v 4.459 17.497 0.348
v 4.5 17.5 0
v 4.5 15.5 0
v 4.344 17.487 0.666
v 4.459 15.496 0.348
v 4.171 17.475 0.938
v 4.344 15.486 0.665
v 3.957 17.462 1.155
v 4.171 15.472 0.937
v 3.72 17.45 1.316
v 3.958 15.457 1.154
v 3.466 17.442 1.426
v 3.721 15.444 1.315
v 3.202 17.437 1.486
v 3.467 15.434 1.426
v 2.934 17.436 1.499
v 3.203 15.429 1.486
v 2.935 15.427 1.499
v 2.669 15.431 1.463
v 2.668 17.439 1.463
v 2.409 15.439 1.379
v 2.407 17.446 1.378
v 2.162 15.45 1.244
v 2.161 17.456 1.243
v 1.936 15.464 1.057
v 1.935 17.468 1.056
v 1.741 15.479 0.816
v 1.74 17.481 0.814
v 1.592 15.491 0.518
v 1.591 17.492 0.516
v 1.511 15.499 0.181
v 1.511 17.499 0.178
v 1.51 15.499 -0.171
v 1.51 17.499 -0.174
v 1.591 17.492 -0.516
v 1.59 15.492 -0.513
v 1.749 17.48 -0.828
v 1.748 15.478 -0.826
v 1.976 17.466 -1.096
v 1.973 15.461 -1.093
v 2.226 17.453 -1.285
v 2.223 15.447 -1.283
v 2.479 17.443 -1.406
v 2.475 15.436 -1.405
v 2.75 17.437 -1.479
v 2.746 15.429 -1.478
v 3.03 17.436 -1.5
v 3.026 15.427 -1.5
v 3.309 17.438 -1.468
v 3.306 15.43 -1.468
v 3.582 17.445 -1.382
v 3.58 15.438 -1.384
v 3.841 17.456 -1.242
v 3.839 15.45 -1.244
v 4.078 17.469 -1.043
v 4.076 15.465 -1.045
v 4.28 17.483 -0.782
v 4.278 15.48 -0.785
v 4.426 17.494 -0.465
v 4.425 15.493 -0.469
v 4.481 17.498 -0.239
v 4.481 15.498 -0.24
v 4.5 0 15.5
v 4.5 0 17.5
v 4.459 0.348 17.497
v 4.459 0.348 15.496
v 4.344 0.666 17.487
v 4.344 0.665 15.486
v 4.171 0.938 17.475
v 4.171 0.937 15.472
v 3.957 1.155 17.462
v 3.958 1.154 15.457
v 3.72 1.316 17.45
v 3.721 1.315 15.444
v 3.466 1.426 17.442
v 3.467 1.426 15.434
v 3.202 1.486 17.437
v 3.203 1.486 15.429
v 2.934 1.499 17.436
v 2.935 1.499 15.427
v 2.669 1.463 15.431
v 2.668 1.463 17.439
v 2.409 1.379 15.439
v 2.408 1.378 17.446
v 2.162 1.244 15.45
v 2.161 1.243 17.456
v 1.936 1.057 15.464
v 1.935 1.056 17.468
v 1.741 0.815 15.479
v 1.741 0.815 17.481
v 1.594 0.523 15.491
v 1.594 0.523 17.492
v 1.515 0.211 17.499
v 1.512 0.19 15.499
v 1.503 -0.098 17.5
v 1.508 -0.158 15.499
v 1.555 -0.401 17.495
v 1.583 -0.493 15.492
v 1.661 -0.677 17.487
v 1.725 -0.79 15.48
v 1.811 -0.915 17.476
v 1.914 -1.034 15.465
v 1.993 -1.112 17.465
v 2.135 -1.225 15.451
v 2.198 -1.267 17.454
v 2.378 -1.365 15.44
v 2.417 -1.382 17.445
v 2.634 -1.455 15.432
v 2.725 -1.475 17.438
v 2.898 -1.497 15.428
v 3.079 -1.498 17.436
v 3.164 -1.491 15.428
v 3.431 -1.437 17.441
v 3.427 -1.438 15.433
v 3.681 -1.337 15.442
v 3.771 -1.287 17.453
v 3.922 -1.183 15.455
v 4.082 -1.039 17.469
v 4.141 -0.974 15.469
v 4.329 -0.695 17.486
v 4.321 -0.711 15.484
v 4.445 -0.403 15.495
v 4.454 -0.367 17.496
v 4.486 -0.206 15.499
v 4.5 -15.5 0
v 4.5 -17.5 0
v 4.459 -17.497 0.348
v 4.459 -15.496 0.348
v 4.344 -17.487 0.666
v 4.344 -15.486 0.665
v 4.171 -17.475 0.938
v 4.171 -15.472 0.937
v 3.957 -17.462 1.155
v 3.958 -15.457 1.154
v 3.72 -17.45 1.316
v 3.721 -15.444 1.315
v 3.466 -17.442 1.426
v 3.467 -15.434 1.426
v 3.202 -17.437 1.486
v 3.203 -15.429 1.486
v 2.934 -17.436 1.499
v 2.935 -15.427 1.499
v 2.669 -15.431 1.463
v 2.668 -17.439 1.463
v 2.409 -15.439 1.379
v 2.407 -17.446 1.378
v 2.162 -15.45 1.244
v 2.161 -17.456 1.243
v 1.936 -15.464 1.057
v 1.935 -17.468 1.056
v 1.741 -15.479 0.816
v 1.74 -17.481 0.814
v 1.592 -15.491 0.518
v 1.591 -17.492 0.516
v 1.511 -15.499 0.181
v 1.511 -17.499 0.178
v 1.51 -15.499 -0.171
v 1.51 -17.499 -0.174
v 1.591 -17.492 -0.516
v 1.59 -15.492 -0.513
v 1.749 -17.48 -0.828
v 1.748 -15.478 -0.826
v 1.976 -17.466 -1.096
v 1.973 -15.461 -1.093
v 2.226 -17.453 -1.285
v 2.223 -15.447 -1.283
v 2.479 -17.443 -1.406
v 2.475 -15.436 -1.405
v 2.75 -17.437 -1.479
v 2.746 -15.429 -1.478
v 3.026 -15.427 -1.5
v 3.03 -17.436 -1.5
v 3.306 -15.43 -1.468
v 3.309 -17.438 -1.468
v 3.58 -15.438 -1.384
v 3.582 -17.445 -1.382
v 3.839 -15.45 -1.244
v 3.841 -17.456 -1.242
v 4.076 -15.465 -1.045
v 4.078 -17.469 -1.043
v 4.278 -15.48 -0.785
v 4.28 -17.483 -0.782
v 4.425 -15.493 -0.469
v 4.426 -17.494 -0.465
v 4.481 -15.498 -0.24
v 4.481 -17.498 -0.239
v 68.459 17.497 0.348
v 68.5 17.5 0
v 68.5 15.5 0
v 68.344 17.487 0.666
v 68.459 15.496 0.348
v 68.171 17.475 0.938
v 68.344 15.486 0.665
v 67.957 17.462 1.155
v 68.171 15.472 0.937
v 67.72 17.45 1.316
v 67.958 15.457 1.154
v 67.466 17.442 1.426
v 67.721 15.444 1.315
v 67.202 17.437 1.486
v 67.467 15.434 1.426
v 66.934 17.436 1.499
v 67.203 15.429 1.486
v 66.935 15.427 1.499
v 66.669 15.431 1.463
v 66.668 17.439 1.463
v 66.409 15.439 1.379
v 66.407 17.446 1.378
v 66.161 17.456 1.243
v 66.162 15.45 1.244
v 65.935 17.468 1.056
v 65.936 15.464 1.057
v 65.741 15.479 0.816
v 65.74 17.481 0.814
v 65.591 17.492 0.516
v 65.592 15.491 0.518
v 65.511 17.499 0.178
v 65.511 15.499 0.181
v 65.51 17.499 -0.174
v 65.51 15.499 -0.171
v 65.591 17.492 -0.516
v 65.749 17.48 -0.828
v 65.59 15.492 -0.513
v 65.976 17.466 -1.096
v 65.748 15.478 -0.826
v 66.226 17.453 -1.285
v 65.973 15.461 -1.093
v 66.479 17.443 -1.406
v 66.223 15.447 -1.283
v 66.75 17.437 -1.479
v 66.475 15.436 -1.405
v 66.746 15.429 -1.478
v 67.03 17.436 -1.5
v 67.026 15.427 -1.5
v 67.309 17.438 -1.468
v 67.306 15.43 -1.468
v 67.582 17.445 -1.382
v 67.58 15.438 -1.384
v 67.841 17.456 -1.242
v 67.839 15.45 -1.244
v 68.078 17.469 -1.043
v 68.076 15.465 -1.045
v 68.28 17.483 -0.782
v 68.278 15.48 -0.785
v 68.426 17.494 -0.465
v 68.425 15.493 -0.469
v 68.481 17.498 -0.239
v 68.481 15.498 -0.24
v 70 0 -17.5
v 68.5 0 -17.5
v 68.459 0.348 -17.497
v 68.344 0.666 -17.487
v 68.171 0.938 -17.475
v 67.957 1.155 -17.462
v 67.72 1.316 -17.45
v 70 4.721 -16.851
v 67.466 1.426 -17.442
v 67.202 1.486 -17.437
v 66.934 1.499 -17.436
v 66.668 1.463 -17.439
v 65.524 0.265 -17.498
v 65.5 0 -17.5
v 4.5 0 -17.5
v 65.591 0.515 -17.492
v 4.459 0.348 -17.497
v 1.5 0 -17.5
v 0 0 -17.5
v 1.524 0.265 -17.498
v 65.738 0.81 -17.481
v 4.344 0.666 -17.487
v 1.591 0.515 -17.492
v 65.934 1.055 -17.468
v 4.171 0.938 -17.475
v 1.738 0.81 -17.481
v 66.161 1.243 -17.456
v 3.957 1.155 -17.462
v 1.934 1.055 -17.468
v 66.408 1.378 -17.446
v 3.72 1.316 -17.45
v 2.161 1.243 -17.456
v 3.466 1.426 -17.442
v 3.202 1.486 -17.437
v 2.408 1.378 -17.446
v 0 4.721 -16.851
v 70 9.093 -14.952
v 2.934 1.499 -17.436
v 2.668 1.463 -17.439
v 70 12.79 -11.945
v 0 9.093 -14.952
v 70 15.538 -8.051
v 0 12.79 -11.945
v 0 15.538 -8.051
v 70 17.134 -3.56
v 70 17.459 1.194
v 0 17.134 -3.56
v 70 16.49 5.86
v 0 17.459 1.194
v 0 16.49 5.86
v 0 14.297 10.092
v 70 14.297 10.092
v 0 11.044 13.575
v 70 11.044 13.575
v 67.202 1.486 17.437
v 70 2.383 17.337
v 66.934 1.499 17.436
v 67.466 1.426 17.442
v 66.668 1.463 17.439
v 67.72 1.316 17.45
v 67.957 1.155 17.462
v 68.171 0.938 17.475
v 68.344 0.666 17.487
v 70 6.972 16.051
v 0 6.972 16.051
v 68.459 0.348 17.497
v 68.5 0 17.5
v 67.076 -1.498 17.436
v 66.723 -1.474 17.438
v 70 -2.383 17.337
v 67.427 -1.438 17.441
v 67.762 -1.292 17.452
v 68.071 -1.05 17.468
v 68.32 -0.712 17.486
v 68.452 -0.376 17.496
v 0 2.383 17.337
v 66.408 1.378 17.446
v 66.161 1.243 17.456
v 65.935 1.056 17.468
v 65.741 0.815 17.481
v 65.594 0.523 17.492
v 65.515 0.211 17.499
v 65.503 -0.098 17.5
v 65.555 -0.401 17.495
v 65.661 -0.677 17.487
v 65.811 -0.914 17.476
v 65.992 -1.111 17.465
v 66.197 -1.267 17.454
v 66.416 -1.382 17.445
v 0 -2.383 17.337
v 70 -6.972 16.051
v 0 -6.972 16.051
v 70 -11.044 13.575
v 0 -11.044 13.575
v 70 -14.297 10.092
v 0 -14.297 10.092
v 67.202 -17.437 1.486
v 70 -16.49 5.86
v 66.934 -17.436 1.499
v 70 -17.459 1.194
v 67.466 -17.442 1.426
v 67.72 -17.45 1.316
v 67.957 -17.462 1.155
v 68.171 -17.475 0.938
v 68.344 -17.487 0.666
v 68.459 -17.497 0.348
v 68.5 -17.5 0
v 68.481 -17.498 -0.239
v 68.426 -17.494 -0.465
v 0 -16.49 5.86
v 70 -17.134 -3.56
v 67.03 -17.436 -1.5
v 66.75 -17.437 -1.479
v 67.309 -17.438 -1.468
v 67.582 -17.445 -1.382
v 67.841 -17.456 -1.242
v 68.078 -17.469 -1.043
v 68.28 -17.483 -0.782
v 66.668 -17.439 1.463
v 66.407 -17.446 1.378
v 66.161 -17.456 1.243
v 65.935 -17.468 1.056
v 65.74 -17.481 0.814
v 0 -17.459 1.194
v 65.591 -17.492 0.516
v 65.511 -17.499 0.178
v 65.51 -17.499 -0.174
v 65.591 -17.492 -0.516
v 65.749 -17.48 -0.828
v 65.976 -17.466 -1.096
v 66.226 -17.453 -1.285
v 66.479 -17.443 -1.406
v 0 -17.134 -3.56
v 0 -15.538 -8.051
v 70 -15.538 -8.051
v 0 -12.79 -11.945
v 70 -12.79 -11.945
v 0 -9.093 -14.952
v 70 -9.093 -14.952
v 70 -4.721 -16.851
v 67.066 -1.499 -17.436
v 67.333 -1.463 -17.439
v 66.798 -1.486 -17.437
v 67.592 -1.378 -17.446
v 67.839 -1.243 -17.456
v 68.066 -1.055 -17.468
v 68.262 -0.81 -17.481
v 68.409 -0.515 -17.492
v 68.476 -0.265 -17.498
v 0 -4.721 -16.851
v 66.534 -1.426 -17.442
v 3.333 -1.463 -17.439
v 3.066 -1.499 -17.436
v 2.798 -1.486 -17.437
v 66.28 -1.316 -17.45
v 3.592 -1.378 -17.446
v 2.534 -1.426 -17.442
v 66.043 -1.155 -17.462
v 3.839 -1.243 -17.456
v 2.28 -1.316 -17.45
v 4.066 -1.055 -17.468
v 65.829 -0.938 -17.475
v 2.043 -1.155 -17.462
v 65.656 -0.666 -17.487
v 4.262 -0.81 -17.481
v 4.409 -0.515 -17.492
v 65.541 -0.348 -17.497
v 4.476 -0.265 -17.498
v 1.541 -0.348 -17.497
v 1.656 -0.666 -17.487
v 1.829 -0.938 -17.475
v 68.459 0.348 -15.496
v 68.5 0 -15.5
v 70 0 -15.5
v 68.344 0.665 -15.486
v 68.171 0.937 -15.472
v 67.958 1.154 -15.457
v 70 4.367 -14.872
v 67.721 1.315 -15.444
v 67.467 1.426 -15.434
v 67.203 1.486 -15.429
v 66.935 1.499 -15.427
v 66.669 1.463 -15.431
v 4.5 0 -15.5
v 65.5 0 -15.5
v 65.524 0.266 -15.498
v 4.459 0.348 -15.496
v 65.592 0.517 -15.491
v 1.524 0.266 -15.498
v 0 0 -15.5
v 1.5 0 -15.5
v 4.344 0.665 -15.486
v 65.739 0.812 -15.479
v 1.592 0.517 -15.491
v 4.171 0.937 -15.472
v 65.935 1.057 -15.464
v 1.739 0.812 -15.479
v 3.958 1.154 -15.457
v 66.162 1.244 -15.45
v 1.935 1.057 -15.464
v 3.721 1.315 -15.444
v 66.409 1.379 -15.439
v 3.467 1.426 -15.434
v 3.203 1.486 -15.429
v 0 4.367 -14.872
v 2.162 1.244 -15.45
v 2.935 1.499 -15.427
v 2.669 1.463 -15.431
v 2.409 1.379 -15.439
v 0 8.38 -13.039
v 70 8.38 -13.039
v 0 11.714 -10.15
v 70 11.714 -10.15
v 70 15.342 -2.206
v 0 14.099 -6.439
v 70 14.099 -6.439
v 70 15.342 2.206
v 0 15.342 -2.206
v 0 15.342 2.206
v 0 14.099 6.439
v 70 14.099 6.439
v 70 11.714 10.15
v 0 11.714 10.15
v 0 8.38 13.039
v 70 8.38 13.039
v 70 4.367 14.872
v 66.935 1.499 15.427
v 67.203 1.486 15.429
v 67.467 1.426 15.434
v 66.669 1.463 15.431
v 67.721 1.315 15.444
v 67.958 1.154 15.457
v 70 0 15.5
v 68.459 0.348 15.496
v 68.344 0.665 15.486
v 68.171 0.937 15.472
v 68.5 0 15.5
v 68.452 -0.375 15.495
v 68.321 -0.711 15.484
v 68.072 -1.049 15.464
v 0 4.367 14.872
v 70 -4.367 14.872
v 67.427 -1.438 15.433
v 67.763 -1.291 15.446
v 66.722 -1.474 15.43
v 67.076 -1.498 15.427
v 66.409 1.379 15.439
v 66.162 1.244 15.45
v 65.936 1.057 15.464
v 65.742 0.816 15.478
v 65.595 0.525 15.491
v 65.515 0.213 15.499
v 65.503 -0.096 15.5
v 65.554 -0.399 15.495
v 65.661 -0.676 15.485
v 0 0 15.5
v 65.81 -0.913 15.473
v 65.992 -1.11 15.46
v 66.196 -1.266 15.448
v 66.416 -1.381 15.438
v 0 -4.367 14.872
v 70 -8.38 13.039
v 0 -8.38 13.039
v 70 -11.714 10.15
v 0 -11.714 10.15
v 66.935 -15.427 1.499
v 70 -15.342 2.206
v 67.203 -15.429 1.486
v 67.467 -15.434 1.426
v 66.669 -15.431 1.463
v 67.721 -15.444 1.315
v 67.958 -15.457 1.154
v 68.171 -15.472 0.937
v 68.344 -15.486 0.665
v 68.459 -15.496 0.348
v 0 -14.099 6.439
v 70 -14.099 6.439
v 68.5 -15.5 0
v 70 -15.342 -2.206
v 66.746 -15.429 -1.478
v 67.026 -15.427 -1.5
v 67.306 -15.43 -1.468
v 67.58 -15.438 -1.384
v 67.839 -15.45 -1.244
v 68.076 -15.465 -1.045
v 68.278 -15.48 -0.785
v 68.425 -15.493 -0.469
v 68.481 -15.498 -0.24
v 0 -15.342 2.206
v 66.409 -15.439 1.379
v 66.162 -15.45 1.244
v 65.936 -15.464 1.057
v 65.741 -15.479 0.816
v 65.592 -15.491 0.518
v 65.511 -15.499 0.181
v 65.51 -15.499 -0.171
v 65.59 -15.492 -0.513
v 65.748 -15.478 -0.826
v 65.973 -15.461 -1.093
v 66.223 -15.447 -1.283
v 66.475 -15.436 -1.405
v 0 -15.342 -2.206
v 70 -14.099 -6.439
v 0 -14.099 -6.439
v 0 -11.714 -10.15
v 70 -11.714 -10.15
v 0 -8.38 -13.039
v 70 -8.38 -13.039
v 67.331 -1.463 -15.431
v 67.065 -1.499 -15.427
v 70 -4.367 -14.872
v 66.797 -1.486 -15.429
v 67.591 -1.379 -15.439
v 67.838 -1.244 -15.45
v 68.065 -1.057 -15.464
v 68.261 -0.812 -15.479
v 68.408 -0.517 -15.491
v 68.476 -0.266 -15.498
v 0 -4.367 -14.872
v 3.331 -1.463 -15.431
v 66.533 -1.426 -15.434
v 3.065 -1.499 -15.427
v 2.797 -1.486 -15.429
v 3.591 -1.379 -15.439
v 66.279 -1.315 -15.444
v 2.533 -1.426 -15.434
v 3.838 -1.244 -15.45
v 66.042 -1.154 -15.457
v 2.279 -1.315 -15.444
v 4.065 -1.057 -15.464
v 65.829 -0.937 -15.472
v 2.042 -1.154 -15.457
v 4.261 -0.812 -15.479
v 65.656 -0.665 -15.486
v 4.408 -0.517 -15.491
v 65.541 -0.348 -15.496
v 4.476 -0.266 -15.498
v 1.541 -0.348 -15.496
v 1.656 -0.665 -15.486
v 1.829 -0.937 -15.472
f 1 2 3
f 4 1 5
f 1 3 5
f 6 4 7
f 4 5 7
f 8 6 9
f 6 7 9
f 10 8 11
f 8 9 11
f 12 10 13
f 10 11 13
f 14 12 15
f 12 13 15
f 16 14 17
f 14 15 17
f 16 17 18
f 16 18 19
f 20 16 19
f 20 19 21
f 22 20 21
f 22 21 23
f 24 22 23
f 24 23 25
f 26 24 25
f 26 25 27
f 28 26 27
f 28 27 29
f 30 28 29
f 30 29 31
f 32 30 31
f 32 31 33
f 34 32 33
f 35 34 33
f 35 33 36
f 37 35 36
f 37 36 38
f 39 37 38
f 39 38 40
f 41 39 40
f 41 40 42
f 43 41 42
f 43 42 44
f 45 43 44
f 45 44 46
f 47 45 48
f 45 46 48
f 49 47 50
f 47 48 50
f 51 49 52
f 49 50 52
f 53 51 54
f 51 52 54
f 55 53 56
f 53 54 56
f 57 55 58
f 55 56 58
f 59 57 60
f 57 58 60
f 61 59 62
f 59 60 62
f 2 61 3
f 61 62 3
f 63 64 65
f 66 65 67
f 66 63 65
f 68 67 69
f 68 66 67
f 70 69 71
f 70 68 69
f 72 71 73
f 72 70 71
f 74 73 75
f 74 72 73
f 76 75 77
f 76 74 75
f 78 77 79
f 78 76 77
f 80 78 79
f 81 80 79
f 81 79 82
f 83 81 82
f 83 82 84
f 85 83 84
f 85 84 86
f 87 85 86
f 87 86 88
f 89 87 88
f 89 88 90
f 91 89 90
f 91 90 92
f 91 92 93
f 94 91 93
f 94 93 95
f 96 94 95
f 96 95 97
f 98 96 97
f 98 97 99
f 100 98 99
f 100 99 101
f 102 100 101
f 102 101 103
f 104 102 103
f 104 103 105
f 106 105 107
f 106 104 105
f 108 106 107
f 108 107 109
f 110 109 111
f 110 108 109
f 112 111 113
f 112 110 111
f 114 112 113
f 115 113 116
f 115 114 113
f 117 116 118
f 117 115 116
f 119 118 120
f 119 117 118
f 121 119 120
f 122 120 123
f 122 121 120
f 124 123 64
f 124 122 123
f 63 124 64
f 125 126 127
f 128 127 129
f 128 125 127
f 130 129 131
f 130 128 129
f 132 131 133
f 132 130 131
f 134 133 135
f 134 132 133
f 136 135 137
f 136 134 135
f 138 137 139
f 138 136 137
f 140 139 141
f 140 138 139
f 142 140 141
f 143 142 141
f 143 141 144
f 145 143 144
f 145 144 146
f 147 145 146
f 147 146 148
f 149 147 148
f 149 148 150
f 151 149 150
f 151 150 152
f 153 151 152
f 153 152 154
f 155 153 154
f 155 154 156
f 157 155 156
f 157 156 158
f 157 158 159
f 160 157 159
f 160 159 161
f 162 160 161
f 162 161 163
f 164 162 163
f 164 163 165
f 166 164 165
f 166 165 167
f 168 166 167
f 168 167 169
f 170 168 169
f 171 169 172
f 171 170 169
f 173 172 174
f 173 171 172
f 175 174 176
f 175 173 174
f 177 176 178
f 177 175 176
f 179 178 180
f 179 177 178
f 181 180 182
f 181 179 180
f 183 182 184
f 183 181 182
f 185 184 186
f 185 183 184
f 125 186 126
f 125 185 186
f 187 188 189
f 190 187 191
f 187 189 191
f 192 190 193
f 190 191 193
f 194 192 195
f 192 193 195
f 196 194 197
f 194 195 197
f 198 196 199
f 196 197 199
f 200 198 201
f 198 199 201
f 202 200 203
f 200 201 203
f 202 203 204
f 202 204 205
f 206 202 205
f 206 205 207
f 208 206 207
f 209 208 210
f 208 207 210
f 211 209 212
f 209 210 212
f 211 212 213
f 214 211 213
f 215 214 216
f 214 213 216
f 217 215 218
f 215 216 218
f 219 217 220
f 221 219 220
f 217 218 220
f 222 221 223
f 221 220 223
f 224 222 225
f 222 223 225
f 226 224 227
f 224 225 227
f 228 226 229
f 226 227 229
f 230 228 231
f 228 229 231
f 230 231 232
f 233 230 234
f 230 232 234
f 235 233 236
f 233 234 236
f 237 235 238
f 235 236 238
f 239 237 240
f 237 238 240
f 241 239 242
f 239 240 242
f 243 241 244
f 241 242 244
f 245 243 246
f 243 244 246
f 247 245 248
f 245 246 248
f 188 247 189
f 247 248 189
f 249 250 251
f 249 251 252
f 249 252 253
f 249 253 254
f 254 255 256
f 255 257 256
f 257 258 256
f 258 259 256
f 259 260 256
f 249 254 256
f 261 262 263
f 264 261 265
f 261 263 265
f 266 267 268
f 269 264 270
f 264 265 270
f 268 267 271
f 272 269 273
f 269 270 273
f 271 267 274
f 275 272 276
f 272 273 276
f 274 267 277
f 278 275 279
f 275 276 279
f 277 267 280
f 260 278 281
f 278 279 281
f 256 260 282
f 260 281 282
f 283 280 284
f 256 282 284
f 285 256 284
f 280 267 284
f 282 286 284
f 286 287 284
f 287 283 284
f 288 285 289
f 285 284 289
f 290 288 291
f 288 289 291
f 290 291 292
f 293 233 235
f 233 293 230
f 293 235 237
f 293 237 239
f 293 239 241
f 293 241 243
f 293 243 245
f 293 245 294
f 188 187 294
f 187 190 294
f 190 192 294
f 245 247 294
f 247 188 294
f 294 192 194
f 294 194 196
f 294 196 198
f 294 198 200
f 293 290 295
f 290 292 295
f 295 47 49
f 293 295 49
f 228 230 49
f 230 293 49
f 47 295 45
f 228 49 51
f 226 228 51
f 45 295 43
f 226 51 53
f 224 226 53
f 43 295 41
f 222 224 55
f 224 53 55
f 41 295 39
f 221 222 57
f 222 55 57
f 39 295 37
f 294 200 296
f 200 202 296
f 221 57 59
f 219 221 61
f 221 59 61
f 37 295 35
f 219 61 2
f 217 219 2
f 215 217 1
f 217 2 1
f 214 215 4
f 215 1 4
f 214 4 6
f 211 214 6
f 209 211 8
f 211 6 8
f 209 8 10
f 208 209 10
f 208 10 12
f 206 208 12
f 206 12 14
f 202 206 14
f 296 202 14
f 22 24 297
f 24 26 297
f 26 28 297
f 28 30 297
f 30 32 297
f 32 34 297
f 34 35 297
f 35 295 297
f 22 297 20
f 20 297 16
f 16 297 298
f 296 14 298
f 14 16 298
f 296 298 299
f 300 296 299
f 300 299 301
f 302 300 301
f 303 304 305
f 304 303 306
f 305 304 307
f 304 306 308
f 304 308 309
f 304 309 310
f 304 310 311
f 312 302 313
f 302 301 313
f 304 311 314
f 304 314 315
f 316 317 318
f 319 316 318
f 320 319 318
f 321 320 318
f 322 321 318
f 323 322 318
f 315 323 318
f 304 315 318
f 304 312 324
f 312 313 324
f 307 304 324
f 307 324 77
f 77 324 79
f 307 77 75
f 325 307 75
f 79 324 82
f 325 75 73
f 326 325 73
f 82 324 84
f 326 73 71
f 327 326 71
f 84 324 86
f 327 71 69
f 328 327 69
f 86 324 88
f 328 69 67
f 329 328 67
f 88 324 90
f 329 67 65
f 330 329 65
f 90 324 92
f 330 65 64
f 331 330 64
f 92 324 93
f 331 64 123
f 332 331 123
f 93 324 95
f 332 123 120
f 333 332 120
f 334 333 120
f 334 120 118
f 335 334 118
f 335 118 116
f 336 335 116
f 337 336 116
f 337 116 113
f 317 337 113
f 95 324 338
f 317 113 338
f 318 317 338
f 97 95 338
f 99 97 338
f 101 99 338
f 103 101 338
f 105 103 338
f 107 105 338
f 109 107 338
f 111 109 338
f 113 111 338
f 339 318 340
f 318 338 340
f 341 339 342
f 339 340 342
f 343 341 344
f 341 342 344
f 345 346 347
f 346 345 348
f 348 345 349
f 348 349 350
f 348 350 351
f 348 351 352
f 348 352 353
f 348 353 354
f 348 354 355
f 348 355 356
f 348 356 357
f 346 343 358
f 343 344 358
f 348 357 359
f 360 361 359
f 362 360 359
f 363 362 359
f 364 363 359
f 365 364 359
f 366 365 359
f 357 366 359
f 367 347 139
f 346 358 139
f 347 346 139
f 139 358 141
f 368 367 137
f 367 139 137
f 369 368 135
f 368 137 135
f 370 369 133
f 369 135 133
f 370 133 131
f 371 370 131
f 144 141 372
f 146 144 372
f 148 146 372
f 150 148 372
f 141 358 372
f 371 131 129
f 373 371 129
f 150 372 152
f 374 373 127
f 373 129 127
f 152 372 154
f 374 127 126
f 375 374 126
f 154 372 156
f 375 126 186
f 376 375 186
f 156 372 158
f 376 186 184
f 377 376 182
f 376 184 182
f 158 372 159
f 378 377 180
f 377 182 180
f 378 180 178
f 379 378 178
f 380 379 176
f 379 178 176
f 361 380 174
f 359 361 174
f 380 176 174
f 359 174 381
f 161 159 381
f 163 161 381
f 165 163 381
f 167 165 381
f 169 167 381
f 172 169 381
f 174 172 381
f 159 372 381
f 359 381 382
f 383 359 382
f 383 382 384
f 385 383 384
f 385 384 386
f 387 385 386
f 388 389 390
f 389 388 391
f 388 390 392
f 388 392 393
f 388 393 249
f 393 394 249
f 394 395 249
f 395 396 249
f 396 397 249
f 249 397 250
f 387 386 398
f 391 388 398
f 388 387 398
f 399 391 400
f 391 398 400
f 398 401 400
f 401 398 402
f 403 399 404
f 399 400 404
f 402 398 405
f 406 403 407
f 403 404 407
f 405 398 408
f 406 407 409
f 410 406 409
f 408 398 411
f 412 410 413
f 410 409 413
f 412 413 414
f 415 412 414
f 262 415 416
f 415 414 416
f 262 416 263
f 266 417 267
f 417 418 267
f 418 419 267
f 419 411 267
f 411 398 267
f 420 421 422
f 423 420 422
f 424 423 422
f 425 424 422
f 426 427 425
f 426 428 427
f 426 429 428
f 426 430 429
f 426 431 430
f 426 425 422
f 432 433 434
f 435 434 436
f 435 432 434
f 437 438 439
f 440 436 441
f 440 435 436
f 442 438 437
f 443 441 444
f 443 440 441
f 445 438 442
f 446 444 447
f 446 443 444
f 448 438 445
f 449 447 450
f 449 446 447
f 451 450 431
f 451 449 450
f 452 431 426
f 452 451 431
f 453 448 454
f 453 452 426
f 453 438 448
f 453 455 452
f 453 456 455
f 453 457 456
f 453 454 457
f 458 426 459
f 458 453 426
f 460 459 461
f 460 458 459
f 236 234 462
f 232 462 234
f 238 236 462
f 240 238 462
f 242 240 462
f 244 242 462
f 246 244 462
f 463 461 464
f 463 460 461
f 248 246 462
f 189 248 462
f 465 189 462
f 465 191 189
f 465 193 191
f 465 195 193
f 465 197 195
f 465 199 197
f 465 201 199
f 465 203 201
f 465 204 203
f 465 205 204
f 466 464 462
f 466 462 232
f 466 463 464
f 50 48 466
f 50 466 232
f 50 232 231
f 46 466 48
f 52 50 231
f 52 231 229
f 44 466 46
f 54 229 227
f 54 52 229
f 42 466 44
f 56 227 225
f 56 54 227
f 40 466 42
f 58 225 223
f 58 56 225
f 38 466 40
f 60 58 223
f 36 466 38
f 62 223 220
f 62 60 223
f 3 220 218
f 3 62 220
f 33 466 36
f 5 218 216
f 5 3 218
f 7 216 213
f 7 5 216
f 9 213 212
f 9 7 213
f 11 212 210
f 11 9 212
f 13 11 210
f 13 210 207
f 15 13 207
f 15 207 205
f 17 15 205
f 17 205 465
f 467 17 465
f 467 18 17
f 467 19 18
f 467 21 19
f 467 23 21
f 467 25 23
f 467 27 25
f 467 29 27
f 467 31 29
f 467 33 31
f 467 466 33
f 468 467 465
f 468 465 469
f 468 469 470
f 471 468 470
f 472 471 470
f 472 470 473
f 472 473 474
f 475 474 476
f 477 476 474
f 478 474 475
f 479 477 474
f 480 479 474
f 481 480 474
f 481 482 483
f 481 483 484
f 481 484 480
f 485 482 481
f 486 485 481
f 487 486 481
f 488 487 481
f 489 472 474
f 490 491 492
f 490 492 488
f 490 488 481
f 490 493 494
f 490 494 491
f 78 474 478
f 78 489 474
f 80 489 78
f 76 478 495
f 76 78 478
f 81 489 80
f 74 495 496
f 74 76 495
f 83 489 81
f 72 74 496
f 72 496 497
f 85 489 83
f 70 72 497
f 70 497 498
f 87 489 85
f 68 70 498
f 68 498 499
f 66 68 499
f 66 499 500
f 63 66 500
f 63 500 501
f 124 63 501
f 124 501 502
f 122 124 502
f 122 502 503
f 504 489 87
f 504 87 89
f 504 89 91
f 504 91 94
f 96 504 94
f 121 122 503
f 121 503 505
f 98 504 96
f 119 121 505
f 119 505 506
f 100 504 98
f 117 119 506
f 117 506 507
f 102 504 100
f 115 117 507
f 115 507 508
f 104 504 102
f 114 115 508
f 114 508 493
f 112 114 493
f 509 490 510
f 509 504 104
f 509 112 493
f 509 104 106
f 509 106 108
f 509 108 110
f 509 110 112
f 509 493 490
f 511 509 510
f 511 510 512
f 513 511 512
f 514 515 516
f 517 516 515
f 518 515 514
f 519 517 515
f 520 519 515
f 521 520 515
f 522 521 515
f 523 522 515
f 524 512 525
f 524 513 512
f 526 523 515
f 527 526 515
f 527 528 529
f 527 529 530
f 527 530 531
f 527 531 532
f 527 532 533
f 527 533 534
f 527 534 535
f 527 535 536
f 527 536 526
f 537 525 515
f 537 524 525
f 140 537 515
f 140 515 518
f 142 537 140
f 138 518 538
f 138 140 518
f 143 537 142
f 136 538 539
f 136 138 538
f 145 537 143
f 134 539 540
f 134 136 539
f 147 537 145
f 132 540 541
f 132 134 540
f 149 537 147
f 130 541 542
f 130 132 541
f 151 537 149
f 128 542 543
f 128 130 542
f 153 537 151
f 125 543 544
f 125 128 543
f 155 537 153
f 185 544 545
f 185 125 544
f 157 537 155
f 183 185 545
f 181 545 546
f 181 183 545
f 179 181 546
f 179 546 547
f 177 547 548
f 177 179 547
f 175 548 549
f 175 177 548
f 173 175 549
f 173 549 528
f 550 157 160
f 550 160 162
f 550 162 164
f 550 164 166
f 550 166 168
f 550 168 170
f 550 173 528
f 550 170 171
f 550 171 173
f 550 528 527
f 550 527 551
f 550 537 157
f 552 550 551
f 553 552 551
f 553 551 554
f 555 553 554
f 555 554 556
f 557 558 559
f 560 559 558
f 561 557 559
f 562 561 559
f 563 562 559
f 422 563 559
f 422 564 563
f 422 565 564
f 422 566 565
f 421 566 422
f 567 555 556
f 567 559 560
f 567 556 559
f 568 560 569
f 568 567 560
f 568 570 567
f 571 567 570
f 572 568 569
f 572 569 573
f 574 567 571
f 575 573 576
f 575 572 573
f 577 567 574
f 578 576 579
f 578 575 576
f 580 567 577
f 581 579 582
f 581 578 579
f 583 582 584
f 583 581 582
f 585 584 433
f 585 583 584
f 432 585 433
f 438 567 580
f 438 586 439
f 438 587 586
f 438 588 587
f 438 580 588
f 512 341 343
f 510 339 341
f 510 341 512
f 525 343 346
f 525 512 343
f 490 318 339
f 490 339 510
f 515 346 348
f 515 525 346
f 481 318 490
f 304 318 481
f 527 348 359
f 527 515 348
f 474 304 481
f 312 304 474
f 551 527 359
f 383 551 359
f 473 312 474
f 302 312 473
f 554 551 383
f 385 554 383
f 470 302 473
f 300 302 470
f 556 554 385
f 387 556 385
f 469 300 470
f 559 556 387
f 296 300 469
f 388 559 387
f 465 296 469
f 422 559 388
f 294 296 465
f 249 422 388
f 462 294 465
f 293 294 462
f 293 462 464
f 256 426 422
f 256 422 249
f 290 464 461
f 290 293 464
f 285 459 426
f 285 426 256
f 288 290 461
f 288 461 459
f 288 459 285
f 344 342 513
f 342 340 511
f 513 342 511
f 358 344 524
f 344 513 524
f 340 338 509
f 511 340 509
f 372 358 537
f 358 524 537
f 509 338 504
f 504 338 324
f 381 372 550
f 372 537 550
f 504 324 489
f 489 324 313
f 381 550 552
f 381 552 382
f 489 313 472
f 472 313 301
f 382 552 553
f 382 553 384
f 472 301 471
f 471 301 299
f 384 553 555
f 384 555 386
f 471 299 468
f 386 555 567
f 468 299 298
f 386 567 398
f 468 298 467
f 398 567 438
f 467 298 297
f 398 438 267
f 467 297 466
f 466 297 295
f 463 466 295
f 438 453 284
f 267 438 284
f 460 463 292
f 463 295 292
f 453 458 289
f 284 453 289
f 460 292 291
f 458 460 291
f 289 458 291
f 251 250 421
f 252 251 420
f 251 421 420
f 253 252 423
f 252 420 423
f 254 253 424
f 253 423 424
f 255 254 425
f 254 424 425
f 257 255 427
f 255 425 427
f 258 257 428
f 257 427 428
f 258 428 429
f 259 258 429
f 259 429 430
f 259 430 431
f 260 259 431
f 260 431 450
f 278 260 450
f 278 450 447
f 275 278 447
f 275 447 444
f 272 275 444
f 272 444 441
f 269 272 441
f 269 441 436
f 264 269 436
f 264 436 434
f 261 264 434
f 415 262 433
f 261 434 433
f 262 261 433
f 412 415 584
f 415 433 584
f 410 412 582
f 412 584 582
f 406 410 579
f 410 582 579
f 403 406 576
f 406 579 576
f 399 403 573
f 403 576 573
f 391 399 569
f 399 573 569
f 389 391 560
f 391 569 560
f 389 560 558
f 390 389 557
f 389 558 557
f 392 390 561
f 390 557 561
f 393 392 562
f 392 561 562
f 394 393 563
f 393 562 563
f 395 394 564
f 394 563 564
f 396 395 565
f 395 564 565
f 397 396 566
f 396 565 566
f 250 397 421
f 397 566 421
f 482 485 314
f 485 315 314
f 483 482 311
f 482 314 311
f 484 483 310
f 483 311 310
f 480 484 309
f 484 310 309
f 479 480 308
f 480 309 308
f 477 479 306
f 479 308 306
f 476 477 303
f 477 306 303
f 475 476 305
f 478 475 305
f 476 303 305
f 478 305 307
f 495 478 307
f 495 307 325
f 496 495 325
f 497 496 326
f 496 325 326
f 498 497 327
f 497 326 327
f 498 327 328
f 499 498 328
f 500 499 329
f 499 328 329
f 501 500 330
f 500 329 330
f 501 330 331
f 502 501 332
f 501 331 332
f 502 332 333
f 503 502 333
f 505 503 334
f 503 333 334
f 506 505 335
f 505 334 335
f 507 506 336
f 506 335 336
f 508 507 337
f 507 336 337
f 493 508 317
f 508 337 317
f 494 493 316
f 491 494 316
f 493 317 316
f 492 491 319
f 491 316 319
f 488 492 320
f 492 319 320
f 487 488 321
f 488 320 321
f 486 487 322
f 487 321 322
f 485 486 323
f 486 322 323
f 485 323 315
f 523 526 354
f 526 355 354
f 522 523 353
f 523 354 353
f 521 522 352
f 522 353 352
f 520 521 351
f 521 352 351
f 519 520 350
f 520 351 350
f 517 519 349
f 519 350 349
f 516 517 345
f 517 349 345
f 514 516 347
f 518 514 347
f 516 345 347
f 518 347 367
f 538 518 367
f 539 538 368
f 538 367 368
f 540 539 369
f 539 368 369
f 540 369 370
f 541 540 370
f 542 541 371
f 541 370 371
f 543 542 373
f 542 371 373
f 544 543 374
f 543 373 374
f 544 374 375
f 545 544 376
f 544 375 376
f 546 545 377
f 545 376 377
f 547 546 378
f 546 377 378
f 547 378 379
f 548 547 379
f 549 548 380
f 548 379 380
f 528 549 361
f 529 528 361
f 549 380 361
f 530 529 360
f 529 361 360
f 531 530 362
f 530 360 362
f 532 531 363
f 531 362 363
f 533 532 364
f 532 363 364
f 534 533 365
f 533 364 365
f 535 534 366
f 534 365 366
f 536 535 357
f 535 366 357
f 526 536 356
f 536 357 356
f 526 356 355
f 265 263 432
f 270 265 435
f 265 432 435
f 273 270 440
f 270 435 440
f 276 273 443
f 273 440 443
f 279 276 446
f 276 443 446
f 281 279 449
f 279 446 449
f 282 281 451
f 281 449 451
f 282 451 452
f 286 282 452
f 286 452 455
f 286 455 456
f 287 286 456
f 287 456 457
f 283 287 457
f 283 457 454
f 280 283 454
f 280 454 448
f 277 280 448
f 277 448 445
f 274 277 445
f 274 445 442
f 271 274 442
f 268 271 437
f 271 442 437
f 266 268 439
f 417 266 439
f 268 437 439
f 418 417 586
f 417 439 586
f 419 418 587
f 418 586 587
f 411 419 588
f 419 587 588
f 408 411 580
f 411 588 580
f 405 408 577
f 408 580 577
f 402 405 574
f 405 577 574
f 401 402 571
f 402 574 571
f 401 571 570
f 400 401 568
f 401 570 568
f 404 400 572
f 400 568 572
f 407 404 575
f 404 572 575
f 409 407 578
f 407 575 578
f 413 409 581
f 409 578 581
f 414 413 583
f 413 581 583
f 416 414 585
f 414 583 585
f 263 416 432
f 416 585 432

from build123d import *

# Parameters (mm, degrees)
SKETCH_1_R               = 17.5
SKETCH_1_R_2             = 15.5
EXTRUDE_1_DEPTH          = 70
SKETCH_2_R               = 1.5
CUT_EXTRUDE_1_DEPTH      = 75.246212025
PATTERN_CIRCULAR_1_COUNT = 2
PATTERN_CIRCULAR_1_ANGLE = 90


with BuildPart() as part:
    # Эскиз1 → Бобышка-Вытянуть1 (new body)
    with BuildSketch(Plane(origin=(0, 0, 0), x_dir=(0, 0, -1), z_dir=(1, 0, 0))):
        Circle(SKETCH_1_R)
        Circle(SKETCH_1_R_2, mode=Mode.SUBTRACT)
    extrude(amount=EXTRUDE_1_DEPTH)

    # Эскиз2 → Вырез-Вытянуть1 (cut, symmetric)
    with BuildSketch(Plane.XY):
        with Locations((3, 0)):
            Circle(SKETCH_2_R)
        with Locations((67, 0)):
            Circle(SKETCH_2_R)
    cut_extrude_1 = extrude(amount=CUT_EXTRUDE_1_DEPTH, both=True, mode=Mode.SUBTRACT)

    # Круговой массив1: Вырез-Вытянуть1 ×2 about axis
    pattern_circular_1_axis = Axis((9.527991342, 0, 0), (1, 0, 0))
    for i in range(1, PATTERN_CIRCULAR_1_COUNT):
        add(cut_extrude_1.rotate(pattern_circular_1_axis, i * PATTERN_CIRCULAR_1_ANGLE / (PATTERN_CIRCULAR_1_COUNT - 1)), mode=Mode.SUBTRACT)


solid = part.part
